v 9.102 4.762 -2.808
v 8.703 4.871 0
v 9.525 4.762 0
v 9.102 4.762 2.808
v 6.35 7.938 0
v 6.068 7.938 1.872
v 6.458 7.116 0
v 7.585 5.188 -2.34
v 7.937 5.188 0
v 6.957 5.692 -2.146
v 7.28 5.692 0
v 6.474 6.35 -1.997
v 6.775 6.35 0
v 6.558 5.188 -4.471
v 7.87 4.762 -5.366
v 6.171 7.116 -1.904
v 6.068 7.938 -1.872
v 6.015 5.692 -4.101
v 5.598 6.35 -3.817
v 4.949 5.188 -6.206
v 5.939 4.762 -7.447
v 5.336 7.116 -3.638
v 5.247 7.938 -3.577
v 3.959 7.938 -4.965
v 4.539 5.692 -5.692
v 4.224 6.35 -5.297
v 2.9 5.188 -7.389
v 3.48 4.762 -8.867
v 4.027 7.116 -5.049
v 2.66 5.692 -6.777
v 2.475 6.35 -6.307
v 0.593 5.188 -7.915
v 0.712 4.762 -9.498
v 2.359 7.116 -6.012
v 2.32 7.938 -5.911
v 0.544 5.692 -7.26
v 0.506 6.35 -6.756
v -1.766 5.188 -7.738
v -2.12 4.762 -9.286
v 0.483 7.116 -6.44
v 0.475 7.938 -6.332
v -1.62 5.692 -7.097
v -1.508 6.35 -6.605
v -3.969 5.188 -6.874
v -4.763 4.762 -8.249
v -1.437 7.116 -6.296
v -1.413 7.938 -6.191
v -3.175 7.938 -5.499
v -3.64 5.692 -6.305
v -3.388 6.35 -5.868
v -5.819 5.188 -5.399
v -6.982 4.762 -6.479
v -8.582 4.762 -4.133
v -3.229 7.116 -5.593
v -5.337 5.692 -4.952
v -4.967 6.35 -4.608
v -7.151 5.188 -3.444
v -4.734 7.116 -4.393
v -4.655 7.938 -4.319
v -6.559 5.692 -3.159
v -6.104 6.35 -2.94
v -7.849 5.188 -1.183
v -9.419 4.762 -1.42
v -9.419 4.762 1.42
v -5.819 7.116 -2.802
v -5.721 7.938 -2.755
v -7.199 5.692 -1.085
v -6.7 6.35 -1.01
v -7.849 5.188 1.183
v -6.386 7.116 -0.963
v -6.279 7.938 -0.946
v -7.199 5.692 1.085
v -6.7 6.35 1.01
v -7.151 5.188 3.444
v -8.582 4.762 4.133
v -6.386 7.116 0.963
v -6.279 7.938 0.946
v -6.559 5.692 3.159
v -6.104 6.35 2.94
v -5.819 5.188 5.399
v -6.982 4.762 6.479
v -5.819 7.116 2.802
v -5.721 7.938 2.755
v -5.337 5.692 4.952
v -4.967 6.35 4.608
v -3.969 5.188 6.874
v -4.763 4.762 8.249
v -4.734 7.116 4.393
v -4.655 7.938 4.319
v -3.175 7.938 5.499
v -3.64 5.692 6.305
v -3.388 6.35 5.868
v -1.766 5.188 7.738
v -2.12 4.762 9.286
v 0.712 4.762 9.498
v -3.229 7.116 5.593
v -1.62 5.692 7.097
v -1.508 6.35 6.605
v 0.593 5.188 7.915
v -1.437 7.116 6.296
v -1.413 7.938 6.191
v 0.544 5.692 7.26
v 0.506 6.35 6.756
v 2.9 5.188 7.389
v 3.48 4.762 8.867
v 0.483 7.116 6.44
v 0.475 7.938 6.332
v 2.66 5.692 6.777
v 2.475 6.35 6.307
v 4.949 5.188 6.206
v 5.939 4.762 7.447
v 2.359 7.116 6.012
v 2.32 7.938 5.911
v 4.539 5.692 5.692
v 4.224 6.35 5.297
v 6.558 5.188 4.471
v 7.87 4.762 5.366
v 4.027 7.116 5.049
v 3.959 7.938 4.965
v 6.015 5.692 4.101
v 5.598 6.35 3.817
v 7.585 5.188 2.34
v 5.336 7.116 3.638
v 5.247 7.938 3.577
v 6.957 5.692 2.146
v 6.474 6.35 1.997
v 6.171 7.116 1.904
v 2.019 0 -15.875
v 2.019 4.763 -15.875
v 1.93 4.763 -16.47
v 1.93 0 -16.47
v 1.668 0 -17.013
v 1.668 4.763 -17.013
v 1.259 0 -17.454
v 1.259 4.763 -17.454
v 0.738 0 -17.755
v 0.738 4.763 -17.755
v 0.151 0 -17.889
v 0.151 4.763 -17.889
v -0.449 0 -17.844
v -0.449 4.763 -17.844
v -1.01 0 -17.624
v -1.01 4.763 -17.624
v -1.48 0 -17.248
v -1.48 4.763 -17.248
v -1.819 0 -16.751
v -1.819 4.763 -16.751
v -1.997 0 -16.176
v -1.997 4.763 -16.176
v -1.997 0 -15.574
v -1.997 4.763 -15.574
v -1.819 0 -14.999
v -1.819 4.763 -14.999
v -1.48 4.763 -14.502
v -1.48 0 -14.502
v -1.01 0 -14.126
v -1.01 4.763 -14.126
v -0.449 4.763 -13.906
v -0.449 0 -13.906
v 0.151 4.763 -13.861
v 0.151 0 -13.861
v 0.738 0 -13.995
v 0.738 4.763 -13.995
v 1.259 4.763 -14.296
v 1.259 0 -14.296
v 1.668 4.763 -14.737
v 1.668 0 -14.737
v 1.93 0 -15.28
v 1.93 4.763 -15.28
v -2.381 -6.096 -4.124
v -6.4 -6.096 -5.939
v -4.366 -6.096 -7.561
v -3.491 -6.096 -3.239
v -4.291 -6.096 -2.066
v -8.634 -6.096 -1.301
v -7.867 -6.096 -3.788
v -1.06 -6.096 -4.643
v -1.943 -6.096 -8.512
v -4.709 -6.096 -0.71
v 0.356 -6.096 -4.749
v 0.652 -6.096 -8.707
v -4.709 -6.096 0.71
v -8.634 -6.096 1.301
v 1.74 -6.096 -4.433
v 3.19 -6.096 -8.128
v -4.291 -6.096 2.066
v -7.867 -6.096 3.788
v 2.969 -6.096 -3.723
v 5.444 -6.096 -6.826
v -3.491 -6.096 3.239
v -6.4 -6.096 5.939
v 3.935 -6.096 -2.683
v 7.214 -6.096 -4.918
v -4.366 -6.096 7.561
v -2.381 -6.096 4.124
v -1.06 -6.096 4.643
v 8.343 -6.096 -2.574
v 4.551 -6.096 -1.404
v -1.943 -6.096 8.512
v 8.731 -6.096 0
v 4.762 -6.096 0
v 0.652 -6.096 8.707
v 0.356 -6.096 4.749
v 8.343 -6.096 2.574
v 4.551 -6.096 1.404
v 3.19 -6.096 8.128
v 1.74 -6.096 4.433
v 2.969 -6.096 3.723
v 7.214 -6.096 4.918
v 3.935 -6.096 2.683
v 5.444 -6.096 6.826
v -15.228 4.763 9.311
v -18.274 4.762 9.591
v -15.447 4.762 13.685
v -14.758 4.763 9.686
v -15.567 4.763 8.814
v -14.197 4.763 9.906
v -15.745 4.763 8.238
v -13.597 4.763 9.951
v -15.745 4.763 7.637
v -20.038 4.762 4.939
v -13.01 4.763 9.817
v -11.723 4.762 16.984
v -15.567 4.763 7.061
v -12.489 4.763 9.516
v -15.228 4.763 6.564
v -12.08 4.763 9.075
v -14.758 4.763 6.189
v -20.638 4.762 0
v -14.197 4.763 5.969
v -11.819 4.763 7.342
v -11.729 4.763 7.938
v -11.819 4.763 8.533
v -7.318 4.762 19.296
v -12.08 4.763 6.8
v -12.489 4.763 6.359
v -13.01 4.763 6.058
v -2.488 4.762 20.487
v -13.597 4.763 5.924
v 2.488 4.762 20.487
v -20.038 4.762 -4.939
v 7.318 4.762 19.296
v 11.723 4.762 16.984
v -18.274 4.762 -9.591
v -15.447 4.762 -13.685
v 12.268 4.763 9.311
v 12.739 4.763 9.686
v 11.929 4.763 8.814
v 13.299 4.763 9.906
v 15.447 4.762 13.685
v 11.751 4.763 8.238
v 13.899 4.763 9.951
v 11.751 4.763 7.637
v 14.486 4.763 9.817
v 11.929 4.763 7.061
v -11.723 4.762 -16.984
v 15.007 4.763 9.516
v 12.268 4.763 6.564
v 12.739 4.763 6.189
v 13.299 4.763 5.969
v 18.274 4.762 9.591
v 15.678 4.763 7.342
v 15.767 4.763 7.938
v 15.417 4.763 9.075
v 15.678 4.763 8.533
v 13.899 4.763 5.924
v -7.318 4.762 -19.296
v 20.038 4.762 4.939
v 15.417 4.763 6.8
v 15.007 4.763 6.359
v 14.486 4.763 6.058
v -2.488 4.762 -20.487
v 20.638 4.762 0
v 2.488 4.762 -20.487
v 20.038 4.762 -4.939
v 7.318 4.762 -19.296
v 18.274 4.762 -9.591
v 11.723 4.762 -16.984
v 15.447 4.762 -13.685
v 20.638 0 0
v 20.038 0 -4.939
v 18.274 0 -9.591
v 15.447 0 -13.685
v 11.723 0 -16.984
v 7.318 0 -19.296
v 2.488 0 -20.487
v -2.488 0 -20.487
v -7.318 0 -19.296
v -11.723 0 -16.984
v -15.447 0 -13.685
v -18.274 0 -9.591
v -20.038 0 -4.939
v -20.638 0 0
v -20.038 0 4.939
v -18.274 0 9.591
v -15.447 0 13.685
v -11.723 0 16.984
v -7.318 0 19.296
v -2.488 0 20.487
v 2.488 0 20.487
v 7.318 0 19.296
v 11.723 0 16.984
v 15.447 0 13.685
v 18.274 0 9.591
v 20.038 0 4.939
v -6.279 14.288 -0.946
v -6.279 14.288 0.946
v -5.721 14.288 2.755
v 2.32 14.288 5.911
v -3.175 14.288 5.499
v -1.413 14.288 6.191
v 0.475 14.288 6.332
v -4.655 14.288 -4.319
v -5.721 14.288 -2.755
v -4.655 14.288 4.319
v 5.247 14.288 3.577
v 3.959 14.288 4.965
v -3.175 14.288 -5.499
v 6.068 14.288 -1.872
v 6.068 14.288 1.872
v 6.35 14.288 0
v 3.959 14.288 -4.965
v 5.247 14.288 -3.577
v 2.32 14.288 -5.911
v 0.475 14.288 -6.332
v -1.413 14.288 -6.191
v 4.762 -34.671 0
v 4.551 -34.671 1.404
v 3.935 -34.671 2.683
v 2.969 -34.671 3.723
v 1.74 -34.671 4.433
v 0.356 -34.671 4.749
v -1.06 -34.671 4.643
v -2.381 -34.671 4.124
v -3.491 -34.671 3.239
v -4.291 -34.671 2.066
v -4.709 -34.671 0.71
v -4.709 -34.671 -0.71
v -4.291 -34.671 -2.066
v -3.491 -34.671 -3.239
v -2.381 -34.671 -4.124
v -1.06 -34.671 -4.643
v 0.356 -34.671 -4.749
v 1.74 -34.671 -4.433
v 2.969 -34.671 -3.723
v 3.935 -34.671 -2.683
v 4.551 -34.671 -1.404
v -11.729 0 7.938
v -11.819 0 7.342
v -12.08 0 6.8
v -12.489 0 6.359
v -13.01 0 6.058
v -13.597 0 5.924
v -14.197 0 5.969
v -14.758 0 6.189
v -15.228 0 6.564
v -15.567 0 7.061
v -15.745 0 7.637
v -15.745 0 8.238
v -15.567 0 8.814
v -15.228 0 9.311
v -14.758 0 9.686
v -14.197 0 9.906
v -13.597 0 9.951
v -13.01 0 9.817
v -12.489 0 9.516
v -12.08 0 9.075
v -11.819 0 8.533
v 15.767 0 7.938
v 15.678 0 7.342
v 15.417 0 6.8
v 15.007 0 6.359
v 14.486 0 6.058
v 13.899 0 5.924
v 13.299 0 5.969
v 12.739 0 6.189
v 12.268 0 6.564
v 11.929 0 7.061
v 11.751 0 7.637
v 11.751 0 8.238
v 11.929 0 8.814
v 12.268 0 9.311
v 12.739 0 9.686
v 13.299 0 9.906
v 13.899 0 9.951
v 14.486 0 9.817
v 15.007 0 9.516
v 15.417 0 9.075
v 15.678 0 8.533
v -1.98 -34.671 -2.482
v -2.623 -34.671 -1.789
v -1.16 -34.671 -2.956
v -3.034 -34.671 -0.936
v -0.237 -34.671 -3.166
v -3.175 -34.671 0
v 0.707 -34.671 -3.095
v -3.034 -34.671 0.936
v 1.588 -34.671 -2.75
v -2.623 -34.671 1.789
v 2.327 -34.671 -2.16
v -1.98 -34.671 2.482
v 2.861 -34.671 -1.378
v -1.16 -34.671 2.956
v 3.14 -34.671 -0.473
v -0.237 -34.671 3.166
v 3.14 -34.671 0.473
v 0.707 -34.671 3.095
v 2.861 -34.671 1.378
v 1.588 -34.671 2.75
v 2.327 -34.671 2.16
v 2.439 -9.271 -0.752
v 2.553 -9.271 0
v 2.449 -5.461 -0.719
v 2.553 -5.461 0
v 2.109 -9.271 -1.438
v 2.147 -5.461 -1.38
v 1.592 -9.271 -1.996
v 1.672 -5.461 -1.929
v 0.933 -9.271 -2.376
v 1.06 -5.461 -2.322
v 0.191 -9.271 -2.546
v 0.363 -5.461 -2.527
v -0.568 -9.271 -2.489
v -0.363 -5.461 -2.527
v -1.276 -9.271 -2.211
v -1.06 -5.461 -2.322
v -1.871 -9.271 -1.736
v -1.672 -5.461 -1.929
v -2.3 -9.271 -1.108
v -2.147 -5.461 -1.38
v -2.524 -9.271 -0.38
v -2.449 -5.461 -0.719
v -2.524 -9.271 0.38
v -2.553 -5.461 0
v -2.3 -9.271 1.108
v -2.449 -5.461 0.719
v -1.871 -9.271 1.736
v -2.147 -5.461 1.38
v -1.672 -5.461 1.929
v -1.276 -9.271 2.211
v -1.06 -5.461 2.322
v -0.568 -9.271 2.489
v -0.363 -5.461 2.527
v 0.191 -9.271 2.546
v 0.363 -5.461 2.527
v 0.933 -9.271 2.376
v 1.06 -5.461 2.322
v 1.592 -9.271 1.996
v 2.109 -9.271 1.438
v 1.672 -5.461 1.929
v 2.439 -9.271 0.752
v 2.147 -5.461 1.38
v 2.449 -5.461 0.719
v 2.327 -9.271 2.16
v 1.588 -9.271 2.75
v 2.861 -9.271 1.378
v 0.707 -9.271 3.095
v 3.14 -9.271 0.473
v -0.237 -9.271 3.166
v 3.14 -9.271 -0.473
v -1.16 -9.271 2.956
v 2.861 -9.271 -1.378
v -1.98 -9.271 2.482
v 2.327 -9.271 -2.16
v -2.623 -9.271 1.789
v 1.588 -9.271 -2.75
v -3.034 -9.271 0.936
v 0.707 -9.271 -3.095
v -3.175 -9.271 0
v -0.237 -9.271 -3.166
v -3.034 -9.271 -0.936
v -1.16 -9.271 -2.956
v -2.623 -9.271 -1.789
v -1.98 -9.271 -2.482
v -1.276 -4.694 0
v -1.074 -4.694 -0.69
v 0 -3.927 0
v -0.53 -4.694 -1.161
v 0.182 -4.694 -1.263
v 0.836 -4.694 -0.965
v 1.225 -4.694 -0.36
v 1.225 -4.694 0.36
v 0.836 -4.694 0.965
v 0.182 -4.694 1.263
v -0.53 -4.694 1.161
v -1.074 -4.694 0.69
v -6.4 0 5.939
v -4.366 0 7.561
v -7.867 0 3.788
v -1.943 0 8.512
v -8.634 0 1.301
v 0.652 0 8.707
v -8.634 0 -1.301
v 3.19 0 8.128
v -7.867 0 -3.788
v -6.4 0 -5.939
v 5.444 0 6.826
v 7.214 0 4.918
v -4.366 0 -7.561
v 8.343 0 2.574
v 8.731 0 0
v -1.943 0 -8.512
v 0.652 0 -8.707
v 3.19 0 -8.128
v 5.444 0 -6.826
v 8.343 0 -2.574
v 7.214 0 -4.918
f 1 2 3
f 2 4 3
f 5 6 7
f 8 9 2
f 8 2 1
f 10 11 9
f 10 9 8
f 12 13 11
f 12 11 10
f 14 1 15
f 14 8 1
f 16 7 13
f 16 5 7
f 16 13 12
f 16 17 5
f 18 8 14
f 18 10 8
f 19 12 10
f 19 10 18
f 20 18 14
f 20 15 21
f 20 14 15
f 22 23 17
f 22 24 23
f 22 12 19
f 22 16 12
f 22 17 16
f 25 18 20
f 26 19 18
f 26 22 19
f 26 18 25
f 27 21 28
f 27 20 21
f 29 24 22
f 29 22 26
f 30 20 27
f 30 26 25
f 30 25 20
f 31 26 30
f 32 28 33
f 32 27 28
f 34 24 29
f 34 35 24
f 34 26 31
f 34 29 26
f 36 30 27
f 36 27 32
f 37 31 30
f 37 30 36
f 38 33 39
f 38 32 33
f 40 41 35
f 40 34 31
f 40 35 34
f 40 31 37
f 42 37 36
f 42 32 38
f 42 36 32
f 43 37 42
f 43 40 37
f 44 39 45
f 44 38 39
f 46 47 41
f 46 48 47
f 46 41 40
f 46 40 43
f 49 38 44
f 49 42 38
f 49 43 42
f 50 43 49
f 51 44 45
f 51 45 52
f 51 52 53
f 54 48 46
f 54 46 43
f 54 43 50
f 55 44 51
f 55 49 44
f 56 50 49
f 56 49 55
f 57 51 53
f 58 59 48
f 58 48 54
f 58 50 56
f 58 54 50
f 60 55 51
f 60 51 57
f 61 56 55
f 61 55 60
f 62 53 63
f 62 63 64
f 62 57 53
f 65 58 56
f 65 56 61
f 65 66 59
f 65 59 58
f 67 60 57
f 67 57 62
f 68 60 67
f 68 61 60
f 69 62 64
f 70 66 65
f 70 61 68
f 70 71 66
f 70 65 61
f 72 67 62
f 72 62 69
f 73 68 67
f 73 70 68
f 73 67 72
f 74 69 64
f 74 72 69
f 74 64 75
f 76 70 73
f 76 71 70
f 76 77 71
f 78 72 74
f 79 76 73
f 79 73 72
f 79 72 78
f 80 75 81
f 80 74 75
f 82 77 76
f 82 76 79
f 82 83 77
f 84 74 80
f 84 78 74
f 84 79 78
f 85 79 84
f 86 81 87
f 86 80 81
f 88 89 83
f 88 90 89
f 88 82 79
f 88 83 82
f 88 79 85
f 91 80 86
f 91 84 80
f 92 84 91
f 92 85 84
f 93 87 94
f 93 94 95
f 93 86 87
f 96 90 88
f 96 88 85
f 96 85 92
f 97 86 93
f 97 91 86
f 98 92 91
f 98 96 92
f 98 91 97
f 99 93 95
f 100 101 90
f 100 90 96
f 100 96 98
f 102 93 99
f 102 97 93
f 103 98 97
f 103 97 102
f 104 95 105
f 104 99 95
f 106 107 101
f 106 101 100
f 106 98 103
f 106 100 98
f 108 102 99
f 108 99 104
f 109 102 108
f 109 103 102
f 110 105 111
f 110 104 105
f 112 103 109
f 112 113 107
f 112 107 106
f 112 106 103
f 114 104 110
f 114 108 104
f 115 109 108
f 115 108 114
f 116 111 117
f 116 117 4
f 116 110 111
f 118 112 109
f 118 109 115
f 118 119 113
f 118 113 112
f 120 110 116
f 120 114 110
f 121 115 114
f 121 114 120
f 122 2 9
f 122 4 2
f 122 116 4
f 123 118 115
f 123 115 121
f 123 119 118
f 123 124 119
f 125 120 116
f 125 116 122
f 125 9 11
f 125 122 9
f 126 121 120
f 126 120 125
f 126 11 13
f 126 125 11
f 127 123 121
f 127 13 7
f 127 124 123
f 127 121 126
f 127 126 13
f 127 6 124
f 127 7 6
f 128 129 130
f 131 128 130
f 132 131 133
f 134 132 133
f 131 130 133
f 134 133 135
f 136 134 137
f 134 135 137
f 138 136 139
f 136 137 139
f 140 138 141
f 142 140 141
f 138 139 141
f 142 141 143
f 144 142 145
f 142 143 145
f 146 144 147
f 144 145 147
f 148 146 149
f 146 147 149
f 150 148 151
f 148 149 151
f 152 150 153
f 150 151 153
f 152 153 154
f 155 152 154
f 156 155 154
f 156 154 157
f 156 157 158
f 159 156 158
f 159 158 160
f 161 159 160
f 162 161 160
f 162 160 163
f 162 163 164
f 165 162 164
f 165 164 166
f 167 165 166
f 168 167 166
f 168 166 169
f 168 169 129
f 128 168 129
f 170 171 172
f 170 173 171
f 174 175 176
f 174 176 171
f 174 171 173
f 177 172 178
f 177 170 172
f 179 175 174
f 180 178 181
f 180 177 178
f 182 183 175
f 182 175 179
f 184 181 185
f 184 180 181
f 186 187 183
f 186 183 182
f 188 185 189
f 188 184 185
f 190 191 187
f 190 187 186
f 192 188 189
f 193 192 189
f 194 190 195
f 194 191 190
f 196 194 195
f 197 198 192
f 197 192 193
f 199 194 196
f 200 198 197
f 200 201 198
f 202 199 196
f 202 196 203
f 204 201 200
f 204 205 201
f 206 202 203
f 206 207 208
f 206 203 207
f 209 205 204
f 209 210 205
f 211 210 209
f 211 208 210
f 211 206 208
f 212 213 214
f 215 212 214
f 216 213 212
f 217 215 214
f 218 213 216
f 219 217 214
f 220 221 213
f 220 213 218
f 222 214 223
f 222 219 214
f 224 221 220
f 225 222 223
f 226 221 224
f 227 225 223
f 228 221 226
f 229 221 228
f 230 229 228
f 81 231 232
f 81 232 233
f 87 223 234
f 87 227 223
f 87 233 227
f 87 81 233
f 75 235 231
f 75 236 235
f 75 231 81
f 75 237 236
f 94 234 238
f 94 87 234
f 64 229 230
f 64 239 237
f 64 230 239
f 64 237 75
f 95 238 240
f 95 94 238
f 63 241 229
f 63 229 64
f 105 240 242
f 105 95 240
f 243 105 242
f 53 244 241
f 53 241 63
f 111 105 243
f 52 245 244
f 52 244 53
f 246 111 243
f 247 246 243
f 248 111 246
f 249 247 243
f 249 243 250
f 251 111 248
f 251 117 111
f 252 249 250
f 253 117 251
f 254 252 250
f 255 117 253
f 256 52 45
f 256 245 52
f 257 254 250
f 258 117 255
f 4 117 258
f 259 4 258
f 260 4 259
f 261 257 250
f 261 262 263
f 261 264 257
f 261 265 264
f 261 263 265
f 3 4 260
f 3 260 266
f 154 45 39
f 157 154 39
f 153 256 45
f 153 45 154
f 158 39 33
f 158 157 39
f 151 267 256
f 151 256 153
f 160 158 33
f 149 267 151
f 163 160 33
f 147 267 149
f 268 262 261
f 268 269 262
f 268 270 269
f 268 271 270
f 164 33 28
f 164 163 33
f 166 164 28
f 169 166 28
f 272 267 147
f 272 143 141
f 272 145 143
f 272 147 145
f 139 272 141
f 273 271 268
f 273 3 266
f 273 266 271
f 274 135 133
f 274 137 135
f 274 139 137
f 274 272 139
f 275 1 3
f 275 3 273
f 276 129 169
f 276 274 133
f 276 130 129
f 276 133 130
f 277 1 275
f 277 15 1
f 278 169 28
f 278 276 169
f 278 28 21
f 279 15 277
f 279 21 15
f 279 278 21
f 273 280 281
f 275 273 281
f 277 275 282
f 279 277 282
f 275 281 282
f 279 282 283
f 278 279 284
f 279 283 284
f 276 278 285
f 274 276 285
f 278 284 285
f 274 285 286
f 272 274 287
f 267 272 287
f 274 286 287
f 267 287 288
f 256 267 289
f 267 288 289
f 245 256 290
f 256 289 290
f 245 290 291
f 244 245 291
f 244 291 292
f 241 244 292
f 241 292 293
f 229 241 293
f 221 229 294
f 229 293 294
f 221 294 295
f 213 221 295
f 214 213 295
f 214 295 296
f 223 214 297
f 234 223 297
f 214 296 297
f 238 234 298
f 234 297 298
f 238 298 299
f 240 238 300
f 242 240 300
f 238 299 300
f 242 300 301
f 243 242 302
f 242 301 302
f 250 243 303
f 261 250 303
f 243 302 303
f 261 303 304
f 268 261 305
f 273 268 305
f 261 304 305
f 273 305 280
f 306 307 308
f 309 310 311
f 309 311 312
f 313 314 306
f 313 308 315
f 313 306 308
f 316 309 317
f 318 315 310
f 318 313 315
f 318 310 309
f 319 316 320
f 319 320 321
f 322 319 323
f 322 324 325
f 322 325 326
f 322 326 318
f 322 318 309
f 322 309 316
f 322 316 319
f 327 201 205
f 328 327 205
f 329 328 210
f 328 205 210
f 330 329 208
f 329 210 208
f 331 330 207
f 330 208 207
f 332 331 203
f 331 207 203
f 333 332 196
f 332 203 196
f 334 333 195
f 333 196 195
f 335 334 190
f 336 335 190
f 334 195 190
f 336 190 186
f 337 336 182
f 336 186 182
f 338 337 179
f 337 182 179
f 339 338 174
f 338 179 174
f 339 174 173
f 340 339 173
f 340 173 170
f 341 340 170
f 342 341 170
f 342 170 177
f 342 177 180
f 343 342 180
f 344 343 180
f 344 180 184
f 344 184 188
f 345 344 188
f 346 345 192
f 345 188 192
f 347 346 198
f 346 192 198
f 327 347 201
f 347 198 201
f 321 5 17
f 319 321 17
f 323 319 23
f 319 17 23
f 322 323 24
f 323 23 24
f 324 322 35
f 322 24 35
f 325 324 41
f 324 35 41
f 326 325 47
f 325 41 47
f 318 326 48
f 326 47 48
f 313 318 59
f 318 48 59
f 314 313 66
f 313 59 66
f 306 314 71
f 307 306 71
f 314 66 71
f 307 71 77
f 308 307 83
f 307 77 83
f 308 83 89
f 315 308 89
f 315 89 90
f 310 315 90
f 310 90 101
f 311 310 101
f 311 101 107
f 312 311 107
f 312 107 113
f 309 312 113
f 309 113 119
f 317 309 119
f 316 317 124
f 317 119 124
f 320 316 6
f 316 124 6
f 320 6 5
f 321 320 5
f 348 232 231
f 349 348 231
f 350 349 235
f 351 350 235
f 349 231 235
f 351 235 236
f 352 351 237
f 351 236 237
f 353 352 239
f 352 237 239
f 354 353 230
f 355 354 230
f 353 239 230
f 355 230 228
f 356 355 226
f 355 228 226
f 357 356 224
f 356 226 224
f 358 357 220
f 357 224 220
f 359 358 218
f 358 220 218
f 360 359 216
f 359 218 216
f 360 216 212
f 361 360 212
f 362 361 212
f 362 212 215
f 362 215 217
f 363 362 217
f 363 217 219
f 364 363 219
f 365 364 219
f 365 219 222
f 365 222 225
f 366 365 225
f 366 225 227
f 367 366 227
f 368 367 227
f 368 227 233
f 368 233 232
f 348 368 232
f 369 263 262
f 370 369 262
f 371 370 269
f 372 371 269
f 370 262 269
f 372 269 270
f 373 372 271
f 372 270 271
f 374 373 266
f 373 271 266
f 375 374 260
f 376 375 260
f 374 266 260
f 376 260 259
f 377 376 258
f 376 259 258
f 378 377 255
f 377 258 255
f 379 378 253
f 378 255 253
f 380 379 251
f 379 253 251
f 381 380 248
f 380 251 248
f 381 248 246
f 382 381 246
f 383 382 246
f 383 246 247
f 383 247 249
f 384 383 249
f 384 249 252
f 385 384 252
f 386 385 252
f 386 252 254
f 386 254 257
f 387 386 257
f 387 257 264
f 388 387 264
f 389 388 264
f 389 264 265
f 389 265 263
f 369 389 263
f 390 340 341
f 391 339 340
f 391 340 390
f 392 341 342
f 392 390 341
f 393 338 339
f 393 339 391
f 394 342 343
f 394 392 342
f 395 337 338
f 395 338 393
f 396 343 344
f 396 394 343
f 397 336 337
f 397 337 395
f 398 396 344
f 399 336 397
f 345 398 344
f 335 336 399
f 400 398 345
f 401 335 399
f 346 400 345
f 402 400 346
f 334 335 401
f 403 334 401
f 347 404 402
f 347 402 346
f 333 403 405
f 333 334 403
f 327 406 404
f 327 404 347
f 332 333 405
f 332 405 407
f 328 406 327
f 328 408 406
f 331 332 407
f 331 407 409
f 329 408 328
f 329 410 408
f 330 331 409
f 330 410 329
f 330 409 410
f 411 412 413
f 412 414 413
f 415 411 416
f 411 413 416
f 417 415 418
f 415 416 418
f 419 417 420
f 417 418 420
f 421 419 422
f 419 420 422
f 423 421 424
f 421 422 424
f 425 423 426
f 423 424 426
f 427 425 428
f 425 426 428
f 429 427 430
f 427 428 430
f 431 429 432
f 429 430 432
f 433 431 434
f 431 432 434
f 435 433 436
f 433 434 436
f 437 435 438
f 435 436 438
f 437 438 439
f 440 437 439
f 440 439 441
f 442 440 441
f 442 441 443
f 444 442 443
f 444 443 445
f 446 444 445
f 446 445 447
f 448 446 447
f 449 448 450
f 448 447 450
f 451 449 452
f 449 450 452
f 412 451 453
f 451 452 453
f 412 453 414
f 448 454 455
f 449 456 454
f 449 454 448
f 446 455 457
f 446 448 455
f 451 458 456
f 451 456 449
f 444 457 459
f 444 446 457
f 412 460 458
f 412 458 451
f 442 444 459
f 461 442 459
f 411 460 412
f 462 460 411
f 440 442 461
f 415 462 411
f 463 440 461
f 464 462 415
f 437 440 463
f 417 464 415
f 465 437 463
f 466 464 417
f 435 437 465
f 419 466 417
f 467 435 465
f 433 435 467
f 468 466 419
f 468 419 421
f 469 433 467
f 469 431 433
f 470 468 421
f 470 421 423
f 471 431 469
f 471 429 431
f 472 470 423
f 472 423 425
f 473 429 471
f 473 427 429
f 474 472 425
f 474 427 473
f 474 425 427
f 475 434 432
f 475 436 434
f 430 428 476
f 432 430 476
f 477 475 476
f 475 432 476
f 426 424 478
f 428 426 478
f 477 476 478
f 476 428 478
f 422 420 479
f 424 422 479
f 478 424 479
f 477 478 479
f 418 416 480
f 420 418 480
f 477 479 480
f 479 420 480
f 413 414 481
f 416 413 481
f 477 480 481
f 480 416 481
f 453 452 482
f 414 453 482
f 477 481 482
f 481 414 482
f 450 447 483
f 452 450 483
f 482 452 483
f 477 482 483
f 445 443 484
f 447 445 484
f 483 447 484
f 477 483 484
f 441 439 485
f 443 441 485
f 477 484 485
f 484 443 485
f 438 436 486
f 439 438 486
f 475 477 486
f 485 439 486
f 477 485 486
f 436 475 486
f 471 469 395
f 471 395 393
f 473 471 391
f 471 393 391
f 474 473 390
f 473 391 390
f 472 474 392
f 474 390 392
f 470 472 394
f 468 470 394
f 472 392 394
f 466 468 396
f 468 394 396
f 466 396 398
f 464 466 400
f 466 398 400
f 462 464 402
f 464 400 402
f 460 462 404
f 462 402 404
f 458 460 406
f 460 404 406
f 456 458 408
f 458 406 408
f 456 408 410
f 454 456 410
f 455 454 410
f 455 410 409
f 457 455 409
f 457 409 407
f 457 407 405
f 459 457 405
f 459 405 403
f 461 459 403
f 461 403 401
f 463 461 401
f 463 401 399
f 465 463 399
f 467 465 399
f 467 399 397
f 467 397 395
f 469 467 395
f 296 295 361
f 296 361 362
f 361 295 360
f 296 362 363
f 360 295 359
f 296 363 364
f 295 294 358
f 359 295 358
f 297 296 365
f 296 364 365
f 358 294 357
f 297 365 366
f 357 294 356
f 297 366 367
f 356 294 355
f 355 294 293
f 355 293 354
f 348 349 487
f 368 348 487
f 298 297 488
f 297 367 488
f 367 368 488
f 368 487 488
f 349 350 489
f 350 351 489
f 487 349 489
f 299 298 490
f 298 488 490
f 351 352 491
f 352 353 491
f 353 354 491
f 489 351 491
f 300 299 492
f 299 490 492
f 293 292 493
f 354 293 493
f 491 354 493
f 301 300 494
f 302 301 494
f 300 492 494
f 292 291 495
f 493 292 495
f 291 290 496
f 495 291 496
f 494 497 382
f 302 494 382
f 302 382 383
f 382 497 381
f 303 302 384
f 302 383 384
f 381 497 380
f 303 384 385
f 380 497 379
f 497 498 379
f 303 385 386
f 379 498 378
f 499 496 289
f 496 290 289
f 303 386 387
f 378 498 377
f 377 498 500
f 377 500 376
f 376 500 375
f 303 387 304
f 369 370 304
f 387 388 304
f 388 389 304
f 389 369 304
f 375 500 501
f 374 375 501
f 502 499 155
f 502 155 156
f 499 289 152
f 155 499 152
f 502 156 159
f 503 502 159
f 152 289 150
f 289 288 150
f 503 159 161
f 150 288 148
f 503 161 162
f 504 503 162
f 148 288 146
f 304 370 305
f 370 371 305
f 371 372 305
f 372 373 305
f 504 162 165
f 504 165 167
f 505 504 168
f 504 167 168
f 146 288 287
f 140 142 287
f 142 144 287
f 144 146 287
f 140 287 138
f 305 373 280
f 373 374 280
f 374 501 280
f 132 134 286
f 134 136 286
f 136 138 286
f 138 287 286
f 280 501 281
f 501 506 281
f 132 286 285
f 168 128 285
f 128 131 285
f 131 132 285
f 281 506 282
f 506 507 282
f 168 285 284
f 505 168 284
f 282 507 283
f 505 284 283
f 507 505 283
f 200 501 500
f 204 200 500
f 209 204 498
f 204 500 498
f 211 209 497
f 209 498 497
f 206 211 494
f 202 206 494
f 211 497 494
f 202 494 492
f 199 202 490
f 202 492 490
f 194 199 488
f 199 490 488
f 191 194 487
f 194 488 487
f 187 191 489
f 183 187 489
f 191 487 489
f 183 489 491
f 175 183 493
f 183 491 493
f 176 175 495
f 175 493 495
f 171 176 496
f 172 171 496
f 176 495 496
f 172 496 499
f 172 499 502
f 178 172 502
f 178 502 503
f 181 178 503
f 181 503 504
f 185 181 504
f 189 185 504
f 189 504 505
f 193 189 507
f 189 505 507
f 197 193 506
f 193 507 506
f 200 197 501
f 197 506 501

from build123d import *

# Parameters (mm, degrees)
SKETCH1_R                         = 20.6375
BOSS_EXTRUDE1_DEPTH               = 4.7625
SKETCH2_R                         = 8.73125
BOSS_EXTRUDE2_DEPTH               = 6.096
SKETCH5_R                         = 4.7625
BOSS_EXTRUDE3_DEPTH               = 28.575
F_1_4_20_TAPPED_HOLE2_D           = 5.1054
F_1_4_20_TAPPED_HOLE2_DEPTH       = 29.21
F_1_4_20_TAPPED_HOLE2_CBORE_D     = 6.35
F_1_4_20_TAPPED_HOLE2_CBORE_DEPTH = 25.4
F_1_4_20_TAPPED_HOLE2_TIP         = 1.533816902
F_10_32_TAPPED_HOLE1_D            = 4.0386
SKETCH11_R                        = 6.35
BOSS_EXTRUDE4_DEPTH               = 9.525
FILLET1_R                         = 3.175


with BuildPart() as part:
    # Sketch1 → Boss-Extrude1 (new body)
    with BuildSketch(Plane(origin=(0, 0, 0), x_dir=(1, 0, 0), z_dir=(0, 1, 0))):
        Circle(SKETCH1_R)
    extrude(amount=BOSS_EXTRUDE1_DEPTH)

    # Sketch2 → Boss-Extrude2 (add)
    with BuildSketch(Plane.XZ):
        Circle(SKETCH2_R)
    extrude(amount=BOSS_EXTRUDE2_DEPTH)

    # Sketch5 → Boss-Extrude3 (add)
    with BuildSketch(Plane.XZ.offset(6.096)):
        Circle(SKETCH5_R)
    extrude(amount=BOSS_EXTRUDE3_DEPTH)

    # 1/4-20 Tapped Hole2
    with Locations(Plane(origin=(0, -34.671, 0), x_dir=(-1, 0, 0), z_dir=(0, -1, 0))):
        with Locations((0, 0)):
            CounterBoreHole(F_1_4_20_TAPPED_HOLE2_D / 2, F_1_4_20_TAPPED_HOLE2_CBORE_D / 2, F_1_4_20_TAPPED_HOLE2_CBORE_DEPTH, depth=F_1_4_20_TAPPED_HOLE2_DEPTH)
            with Locations((0, 0, -(F_1_4_20_TAPPED_HOLE2_DEPTH + F_1_4_20_TAPPED_HOLE2_TIP / 2))):  # 118° drill point
                Cone(0, F_1_4_20_TAPPED_HOLE2_D / 2, F_1_4_20_TAPPED_HOLE2_TIP, mode=Mode.SUBTRACT)

    # #10-32 Tapped Hole1 (through all)
    with Locations(Plane(origin=(0, 0, 0), x_dir=(-1, 0, 0), z_dir=(0, -1, 0))):
        with Locations((-13.748153285, -7.9375), (0, 15.875), (13.748153285, -7.9375)):
            Hole(F_10_32_TAPPED_HOLE1_D / 2)

    # Sketch11 → Boss-Extrude4 (add)
    with BuildSketch(Plane(origin=(0, 4.7625, 0), x_dir=(1, 0, 0), z_dir=(0, 1, 0))):
        Circle(SKETCH11_R)
    extrude(amount=BOSS_EXTRUDE4_DEPTH)

    # Fillet1
    fillet1_edges = [part.edges().sort_by_distance(p)[0] for p in [
        (-6.35, 4.7625, 0),
    ]]
    fillet(fillet1_edges, radius=FILLET1_R)


solid = part.part
